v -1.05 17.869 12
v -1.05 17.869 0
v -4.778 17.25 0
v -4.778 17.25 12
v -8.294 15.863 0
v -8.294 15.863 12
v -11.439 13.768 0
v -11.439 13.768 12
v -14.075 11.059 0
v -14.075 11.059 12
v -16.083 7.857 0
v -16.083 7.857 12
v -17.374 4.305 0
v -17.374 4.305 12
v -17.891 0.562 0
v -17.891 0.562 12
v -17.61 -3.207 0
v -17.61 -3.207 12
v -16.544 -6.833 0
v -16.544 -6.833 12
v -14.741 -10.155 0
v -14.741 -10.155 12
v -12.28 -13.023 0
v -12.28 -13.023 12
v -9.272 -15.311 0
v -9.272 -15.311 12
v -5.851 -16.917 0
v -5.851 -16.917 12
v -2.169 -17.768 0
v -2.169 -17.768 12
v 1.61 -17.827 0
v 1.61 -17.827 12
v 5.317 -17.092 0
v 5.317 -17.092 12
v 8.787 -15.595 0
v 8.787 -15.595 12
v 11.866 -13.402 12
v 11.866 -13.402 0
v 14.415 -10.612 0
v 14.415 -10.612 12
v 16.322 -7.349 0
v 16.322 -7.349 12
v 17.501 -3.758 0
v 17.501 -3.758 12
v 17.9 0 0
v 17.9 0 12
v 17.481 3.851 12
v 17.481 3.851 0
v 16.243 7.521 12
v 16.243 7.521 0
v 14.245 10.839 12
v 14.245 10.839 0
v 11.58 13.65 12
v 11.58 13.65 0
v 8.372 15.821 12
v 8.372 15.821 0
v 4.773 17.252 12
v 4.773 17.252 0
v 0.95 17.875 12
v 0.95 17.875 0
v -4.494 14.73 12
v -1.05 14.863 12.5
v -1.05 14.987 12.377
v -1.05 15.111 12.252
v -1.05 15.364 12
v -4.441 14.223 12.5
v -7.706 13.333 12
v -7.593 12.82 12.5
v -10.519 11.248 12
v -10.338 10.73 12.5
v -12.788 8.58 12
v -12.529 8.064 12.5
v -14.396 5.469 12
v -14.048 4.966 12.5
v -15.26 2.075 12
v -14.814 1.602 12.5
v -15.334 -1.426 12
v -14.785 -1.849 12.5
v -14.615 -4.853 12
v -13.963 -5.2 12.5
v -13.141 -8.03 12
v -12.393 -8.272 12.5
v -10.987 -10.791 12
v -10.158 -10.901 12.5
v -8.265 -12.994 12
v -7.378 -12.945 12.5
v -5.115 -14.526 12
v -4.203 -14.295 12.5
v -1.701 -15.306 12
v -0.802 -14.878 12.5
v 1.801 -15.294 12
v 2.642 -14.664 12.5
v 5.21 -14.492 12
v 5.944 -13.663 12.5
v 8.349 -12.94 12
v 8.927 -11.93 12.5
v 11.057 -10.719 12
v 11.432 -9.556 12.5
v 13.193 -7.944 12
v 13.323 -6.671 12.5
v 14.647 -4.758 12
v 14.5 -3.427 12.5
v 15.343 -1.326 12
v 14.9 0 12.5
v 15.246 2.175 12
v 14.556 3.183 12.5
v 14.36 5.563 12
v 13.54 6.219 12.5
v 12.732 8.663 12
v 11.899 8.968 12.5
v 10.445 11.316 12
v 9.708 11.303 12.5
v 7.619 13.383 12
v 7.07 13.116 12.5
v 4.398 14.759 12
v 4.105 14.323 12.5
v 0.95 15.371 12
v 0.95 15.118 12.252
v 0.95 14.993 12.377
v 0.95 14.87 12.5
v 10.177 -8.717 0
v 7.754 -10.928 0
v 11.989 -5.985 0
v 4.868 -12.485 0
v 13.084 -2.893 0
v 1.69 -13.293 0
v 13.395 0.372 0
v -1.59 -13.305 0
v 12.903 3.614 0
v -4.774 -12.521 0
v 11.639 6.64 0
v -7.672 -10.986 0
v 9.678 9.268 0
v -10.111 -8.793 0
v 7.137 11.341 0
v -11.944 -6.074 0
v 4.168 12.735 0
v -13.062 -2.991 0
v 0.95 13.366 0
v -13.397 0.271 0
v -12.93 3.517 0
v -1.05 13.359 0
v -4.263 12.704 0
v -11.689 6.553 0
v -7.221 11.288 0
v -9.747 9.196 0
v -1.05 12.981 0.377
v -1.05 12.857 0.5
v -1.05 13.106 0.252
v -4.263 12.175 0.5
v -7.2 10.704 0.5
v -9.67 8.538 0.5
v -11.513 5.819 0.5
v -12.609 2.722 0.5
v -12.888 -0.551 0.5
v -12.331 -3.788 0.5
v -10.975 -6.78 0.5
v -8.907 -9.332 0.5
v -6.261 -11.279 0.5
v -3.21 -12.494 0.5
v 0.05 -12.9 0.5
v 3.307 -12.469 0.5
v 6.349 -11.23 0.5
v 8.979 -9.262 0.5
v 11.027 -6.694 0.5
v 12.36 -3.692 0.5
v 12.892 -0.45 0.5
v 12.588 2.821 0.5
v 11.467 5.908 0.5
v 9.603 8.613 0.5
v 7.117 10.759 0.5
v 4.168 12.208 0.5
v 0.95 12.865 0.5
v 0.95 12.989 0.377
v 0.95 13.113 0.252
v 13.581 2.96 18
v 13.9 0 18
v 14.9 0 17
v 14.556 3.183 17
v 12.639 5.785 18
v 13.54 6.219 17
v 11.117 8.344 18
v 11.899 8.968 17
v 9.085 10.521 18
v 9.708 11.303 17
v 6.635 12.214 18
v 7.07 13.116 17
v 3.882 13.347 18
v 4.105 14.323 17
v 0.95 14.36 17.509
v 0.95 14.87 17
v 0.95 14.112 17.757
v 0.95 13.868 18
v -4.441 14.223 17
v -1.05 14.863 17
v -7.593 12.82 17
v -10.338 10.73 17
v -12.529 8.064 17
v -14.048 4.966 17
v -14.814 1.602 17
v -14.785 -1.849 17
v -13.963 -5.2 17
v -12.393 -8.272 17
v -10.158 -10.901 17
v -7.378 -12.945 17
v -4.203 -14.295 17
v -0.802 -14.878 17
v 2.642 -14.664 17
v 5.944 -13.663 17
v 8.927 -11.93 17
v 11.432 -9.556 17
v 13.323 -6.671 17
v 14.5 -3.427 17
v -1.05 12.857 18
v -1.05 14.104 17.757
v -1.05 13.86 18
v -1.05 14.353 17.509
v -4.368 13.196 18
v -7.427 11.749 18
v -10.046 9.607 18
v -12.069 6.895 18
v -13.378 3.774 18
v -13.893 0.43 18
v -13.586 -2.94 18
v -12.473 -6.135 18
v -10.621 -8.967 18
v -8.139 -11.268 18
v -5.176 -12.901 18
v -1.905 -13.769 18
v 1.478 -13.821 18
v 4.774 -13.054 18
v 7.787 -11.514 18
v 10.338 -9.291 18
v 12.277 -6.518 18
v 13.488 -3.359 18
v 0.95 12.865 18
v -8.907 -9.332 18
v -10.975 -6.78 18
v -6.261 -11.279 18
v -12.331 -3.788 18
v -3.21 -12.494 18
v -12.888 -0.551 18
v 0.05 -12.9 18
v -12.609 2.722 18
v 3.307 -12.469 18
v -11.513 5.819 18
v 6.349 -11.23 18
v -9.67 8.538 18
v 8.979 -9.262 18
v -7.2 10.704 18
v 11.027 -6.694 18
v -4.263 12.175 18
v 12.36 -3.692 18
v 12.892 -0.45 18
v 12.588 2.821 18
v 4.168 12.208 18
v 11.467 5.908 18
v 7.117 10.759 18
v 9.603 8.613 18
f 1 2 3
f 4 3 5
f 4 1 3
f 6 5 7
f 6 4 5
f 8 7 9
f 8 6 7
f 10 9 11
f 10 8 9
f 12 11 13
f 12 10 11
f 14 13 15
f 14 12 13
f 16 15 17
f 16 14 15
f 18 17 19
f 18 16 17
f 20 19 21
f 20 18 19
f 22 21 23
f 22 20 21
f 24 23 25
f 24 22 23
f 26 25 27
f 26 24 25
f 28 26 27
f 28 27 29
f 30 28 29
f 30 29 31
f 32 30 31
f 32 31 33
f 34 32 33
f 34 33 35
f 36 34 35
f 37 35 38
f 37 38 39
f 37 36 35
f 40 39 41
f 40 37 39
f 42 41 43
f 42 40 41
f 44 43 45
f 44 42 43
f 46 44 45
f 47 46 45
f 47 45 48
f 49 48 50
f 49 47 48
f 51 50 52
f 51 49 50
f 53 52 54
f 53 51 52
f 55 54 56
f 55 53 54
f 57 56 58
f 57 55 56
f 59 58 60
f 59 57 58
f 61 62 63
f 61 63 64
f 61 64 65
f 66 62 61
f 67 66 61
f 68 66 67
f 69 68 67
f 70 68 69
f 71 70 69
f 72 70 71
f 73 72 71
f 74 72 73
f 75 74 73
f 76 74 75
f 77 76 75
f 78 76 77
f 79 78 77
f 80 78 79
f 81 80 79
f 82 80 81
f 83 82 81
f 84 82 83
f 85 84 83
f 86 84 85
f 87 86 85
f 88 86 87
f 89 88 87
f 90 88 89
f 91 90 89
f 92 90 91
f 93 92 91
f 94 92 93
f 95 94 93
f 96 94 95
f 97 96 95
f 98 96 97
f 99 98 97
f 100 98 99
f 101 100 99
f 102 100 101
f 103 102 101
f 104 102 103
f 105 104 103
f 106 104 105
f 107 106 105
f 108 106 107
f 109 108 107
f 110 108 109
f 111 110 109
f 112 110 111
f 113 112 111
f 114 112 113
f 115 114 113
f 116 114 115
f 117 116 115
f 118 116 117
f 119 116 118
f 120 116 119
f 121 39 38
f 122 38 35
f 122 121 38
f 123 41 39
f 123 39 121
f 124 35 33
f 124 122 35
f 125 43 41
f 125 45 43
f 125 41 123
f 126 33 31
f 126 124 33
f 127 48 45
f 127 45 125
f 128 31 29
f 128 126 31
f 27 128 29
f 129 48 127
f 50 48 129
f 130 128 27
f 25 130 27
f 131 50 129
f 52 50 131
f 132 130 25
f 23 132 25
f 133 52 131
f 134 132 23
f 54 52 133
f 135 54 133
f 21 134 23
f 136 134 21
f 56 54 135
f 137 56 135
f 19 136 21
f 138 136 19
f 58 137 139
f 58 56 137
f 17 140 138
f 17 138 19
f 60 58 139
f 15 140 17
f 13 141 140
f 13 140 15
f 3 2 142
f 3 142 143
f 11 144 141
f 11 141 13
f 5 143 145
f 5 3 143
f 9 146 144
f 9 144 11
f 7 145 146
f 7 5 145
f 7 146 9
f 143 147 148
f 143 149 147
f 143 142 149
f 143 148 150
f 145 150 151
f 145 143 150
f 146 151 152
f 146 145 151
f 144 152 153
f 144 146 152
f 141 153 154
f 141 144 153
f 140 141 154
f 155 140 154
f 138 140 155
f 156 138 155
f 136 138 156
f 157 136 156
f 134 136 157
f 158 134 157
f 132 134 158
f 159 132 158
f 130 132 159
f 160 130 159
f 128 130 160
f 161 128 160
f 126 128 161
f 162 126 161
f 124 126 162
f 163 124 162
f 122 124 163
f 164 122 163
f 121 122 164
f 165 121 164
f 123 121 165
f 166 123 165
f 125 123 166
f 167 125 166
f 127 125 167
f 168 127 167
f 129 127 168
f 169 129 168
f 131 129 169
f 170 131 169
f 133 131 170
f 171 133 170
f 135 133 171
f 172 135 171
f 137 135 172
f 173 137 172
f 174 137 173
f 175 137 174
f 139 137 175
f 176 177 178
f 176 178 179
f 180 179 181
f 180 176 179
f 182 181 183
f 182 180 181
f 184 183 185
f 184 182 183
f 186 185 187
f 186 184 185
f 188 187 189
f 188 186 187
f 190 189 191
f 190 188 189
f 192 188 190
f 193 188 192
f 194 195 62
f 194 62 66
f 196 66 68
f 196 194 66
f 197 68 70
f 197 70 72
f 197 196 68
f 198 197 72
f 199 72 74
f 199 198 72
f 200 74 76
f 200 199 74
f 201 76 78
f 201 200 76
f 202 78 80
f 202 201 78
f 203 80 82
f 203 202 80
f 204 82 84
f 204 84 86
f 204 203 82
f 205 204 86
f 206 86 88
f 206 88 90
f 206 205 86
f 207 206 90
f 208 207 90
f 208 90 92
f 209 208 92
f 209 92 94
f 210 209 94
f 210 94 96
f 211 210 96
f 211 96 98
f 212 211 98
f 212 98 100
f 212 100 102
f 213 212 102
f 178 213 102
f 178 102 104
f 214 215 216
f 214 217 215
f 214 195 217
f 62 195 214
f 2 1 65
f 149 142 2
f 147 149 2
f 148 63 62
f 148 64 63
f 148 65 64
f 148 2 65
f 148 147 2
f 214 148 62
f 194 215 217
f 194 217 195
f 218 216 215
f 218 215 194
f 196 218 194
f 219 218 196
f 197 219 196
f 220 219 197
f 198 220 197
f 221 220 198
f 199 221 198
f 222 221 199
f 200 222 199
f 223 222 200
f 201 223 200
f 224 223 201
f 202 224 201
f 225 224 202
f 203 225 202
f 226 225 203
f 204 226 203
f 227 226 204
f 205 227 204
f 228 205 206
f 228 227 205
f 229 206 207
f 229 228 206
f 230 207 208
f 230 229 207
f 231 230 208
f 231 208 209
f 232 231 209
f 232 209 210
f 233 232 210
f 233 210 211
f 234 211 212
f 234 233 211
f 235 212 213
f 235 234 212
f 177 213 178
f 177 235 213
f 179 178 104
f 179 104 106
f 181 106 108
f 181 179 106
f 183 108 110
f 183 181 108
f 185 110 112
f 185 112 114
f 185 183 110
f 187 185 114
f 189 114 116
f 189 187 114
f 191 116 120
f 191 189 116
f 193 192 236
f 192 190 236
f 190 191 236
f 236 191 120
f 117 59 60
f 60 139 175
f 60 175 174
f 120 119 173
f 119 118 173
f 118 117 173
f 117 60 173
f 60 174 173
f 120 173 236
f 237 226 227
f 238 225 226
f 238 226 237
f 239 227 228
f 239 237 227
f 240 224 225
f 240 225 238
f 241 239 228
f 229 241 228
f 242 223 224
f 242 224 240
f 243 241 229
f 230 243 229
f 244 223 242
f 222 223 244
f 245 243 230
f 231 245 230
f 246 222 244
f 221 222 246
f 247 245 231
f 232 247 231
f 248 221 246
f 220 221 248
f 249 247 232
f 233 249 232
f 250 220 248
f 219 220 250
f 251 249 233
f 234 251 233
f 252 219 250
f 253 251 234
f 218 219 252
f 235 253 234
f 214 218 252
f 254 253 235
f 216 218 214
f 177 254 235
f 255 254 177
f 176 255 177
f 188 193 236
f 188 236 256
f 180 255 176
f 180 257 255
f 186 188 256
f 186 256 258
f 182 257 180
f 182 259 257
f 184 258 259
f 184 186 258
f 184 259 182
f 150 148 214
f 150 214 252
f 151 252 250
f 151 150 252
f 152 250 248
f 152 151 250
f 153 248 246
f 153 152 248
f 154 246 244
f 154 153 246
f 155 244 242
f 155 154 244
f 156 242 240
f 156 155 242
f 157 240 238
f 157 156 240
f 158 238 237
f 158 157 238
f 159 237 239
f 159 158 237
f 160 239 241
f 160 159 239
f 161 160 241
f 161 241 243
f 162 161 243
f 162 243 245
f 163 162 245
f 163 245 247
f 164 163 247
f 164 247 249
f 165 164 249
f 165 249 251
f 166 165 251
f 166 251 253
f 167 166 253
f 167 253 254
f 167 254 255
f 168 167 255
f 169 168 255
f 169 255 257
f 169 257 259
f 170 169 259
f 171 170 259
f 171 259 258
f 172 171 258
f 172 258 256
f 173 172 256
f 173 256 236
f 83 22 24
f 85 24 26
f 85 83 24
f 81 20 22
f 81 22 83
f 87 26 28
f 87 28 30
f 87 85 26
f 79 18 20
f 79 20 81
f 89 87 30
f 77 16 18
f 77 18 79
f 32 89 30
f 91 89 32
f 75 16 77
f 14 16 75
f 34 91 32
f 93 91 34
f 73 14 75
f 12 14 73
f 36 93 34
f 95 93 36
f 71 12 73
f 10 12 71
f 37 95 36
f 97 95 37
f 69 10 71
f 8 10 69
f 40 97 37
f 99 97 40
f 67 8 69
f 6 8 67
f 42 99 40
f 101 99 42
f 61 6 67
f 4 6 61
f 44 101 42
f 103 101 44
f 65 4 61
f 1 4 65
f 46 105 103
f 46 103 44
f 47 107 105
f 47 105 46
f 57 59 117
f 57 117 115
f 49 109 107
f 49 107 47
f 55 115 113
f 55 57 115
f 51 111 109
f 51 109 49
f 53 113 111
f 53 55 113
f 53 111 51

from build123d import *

# Parameters (mm, degrees)
CHAMFER_SIZE    = 0.5
CHAMFER001_SIZE = 1
CHAMFER002_SIZE = 0.5
SKETCH001_W     = 2
SKETCH001_H     = 21.821188
POCKET_DEPTH    = 18.001


with BuildPart() as part:
    # Sketch → Revolution (revolve)
    with BuildSketch(Plane.XZ):
        Polygon((12.9, 0), (17.9, 0), (17.9, 12), (14.9, 12), (14.9, 18), (12.9, 18), align=None)
    revolve(axis=Axis((0, 0, 0), (0, 0, 1)))

    # Chamfer
    chamfer_edges = [part.edges().sort_by_distance(p)[0] for p in [
        (-14.9, 0, 12),
    ]]
    chamfer(chamfer_edges, length=CHAMFER_SIZE)

    # Chamfer001
    chamfer001_edges = [part.edges().sort_by_distance(p)[0] for p in [
        (-14.9, 0, 18),
    ]]
    chamfer(chamfer001_edges, length=CHAMFER001_SIZE)

    # Chamfer002
    chamfer002_edges = [part.edges().sort_by_distance(p)[0] for p in [
        (-12.9, 0, 0),
    ]]
    chamfer(chamfer002_edges, length=CHAMFER002_SIZE)

    # Sketch001 (on Face4 of Chamfer002) → Pocket (cut, through all)
    with BuildSketch(Plane(origin=(0, 0, 0), x_dir=(1, 0, 0), z_dir=(0, 0, -1))):
        with Locations((-0.050035, -17.700875)):
            Rectangle(SKETCH001_W, SKETCH001_H)
    extrude(amount=-POCKET_DEPTH, mode=Mode.SUBTRACT)


solid = part.part
